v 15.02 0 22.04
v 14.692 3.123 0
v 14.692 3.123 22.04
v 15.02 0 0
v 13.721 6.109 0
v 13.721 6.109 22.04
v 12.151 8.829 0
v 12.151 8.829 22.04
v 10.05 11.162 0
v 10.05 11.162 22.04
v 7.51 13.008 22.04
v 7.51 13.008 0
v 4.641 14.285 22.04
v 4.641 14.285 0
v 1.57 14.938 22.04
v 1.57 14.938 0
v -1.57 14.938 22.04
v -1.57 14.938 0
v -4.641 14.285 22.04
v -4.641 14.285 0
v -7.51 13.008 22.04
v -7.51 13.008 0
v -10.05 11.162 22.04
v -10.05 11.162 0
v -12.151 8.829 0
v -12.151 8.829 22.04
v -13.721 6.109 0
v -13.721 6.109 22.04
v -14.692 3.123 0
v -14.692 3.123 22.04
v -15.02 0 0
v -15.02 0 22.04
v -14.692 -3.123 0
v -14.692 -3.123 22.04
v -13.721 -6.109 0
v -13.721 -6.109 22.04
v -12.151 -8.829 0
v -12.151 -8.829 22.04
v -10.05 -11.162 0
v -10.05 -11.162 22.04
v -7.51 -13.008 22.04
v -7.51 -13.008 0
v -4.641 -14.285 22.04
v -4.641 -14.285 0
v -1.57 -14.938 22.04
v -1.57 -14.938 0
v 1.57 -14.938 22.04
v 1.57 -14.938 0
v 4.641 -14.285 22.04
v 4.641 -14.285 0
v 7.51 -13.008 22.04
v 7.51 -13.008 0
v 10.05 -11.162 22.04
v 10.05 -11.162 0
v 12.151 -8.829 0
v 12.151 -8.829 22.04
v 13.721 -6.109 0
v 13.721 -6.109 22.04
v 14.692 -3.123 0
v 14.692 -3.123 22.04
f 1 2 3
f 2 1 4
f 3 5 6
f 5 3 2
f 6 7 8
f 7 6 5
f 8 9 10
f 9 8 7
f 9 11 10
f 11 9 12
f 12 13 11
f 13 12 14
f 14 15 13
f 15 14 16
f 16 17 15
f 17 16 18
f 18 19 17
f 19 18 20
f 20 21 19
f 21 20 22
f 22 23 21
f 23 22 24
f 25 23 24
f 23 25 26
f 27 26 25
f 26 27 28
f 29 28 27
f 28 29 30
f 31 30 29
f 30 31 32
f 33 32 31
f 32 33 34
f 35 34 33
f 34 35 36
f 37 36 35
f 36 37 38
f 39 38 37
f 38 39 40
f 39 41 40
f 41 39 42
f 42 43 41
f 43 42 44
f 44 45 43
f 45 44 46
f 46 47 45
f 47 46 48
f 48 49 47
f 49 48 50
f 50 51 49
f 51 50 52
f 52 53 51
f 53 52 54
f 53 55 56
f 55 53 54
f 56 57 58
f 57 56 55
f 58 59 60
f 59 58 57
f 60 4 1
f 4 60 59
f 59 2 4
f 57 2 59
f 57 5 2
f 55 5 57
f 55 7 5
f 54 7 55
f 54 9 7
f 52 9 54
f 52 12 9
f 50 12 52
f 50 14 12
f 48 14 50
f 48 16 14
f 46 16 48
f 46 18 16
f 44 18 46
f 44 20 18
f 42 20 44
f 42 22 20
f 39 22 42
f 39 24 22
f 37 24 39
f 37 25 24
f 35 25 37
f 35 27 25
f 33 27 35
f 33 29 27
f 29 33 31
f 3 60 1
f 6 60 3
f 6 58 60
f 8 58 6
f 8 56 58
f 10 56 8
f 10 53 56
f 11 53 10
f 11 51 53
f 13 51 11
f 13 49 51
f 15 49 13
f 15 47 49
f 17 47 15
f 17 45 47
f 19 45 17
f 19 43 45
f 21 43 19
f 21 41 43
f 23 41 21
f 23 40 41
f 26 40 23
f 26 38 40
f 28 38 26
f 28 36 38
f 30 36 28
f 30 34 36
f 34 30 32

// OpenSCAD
// file: LinearBearing.scad
use <../Parameters.scad>

function LinearBearingDiam() = 15 + 3dPrinterTolerance();
function LinearBearingInnerDiam() = 8.3 + 3dPrinterTolerance();
function LinearBearingHeight() = 24 + 3dPrinterTolerance();

module LinearBearing()
{
cylinder(LinearBearingHeight(), LinearBearingDiam()/2, LinearBearingDiam()/2, 0);
}


LinearBearing();
// file: Zrod.scad
use <../Parameters.scad>

function ZrodLength()=1000;
function ZrodDiameter()=8 + 3dPrinterTolerance()*2;  //base case: 8
function ZrodRadius()=ZrodDiameter()/2;

module Zrod()
{
color("Silver")
cylinder(ZrodLength(), ZrodRadius(), ZrodRadius());
}

Zrod();
// file: ../Parameters.scad
use<Vitamins/Zrod.scad>
use<Vitamins/LinearBearing.scad>

function mm(i) = i*25.4; 

//Build dimensions (x,y,z)-- x, y and z of printable area, NOT of overall device

//z-rod length, diameter-- dependent on which rods you buy
//(bearing diameter is dependent on rod diameter)


function ZBearingSpacing()= 105;
function ZrodSpacing()=ZBearingSpacing()-LinearBearingDiam()*2-PlasticWidth()*4;


//parametric of which hotend is being used (printerbot or bucha nozzle)

//stepper vs servo

//3 parameters (1 for each link) horizontal vs vertical

//paper is a parametric vitamin

//distance between link arms will be calculable based on radius of toolplate





//tolerances
function LaserCutTolerance() = .02;
function 3dPrinterTolerance() = .04;




//the equation used for plastic width, it can of course be changed
function PlasticWidth()= (ZrodDiameter()/2);
function SideWidth() = (ZrodDiameter()+PlasticWidth());
// main file
use <../Parameters.scad>

function PullyBodyWidth() = 22 + 3dPrinterTolerance();
function PullyDiam() = 30 + 3dPrinterTolerance();

module Pully()
{
	cylinder(PullyBodyWidth(), PullyDiam()/2, PullyDiam()/2);
}

Pully();
